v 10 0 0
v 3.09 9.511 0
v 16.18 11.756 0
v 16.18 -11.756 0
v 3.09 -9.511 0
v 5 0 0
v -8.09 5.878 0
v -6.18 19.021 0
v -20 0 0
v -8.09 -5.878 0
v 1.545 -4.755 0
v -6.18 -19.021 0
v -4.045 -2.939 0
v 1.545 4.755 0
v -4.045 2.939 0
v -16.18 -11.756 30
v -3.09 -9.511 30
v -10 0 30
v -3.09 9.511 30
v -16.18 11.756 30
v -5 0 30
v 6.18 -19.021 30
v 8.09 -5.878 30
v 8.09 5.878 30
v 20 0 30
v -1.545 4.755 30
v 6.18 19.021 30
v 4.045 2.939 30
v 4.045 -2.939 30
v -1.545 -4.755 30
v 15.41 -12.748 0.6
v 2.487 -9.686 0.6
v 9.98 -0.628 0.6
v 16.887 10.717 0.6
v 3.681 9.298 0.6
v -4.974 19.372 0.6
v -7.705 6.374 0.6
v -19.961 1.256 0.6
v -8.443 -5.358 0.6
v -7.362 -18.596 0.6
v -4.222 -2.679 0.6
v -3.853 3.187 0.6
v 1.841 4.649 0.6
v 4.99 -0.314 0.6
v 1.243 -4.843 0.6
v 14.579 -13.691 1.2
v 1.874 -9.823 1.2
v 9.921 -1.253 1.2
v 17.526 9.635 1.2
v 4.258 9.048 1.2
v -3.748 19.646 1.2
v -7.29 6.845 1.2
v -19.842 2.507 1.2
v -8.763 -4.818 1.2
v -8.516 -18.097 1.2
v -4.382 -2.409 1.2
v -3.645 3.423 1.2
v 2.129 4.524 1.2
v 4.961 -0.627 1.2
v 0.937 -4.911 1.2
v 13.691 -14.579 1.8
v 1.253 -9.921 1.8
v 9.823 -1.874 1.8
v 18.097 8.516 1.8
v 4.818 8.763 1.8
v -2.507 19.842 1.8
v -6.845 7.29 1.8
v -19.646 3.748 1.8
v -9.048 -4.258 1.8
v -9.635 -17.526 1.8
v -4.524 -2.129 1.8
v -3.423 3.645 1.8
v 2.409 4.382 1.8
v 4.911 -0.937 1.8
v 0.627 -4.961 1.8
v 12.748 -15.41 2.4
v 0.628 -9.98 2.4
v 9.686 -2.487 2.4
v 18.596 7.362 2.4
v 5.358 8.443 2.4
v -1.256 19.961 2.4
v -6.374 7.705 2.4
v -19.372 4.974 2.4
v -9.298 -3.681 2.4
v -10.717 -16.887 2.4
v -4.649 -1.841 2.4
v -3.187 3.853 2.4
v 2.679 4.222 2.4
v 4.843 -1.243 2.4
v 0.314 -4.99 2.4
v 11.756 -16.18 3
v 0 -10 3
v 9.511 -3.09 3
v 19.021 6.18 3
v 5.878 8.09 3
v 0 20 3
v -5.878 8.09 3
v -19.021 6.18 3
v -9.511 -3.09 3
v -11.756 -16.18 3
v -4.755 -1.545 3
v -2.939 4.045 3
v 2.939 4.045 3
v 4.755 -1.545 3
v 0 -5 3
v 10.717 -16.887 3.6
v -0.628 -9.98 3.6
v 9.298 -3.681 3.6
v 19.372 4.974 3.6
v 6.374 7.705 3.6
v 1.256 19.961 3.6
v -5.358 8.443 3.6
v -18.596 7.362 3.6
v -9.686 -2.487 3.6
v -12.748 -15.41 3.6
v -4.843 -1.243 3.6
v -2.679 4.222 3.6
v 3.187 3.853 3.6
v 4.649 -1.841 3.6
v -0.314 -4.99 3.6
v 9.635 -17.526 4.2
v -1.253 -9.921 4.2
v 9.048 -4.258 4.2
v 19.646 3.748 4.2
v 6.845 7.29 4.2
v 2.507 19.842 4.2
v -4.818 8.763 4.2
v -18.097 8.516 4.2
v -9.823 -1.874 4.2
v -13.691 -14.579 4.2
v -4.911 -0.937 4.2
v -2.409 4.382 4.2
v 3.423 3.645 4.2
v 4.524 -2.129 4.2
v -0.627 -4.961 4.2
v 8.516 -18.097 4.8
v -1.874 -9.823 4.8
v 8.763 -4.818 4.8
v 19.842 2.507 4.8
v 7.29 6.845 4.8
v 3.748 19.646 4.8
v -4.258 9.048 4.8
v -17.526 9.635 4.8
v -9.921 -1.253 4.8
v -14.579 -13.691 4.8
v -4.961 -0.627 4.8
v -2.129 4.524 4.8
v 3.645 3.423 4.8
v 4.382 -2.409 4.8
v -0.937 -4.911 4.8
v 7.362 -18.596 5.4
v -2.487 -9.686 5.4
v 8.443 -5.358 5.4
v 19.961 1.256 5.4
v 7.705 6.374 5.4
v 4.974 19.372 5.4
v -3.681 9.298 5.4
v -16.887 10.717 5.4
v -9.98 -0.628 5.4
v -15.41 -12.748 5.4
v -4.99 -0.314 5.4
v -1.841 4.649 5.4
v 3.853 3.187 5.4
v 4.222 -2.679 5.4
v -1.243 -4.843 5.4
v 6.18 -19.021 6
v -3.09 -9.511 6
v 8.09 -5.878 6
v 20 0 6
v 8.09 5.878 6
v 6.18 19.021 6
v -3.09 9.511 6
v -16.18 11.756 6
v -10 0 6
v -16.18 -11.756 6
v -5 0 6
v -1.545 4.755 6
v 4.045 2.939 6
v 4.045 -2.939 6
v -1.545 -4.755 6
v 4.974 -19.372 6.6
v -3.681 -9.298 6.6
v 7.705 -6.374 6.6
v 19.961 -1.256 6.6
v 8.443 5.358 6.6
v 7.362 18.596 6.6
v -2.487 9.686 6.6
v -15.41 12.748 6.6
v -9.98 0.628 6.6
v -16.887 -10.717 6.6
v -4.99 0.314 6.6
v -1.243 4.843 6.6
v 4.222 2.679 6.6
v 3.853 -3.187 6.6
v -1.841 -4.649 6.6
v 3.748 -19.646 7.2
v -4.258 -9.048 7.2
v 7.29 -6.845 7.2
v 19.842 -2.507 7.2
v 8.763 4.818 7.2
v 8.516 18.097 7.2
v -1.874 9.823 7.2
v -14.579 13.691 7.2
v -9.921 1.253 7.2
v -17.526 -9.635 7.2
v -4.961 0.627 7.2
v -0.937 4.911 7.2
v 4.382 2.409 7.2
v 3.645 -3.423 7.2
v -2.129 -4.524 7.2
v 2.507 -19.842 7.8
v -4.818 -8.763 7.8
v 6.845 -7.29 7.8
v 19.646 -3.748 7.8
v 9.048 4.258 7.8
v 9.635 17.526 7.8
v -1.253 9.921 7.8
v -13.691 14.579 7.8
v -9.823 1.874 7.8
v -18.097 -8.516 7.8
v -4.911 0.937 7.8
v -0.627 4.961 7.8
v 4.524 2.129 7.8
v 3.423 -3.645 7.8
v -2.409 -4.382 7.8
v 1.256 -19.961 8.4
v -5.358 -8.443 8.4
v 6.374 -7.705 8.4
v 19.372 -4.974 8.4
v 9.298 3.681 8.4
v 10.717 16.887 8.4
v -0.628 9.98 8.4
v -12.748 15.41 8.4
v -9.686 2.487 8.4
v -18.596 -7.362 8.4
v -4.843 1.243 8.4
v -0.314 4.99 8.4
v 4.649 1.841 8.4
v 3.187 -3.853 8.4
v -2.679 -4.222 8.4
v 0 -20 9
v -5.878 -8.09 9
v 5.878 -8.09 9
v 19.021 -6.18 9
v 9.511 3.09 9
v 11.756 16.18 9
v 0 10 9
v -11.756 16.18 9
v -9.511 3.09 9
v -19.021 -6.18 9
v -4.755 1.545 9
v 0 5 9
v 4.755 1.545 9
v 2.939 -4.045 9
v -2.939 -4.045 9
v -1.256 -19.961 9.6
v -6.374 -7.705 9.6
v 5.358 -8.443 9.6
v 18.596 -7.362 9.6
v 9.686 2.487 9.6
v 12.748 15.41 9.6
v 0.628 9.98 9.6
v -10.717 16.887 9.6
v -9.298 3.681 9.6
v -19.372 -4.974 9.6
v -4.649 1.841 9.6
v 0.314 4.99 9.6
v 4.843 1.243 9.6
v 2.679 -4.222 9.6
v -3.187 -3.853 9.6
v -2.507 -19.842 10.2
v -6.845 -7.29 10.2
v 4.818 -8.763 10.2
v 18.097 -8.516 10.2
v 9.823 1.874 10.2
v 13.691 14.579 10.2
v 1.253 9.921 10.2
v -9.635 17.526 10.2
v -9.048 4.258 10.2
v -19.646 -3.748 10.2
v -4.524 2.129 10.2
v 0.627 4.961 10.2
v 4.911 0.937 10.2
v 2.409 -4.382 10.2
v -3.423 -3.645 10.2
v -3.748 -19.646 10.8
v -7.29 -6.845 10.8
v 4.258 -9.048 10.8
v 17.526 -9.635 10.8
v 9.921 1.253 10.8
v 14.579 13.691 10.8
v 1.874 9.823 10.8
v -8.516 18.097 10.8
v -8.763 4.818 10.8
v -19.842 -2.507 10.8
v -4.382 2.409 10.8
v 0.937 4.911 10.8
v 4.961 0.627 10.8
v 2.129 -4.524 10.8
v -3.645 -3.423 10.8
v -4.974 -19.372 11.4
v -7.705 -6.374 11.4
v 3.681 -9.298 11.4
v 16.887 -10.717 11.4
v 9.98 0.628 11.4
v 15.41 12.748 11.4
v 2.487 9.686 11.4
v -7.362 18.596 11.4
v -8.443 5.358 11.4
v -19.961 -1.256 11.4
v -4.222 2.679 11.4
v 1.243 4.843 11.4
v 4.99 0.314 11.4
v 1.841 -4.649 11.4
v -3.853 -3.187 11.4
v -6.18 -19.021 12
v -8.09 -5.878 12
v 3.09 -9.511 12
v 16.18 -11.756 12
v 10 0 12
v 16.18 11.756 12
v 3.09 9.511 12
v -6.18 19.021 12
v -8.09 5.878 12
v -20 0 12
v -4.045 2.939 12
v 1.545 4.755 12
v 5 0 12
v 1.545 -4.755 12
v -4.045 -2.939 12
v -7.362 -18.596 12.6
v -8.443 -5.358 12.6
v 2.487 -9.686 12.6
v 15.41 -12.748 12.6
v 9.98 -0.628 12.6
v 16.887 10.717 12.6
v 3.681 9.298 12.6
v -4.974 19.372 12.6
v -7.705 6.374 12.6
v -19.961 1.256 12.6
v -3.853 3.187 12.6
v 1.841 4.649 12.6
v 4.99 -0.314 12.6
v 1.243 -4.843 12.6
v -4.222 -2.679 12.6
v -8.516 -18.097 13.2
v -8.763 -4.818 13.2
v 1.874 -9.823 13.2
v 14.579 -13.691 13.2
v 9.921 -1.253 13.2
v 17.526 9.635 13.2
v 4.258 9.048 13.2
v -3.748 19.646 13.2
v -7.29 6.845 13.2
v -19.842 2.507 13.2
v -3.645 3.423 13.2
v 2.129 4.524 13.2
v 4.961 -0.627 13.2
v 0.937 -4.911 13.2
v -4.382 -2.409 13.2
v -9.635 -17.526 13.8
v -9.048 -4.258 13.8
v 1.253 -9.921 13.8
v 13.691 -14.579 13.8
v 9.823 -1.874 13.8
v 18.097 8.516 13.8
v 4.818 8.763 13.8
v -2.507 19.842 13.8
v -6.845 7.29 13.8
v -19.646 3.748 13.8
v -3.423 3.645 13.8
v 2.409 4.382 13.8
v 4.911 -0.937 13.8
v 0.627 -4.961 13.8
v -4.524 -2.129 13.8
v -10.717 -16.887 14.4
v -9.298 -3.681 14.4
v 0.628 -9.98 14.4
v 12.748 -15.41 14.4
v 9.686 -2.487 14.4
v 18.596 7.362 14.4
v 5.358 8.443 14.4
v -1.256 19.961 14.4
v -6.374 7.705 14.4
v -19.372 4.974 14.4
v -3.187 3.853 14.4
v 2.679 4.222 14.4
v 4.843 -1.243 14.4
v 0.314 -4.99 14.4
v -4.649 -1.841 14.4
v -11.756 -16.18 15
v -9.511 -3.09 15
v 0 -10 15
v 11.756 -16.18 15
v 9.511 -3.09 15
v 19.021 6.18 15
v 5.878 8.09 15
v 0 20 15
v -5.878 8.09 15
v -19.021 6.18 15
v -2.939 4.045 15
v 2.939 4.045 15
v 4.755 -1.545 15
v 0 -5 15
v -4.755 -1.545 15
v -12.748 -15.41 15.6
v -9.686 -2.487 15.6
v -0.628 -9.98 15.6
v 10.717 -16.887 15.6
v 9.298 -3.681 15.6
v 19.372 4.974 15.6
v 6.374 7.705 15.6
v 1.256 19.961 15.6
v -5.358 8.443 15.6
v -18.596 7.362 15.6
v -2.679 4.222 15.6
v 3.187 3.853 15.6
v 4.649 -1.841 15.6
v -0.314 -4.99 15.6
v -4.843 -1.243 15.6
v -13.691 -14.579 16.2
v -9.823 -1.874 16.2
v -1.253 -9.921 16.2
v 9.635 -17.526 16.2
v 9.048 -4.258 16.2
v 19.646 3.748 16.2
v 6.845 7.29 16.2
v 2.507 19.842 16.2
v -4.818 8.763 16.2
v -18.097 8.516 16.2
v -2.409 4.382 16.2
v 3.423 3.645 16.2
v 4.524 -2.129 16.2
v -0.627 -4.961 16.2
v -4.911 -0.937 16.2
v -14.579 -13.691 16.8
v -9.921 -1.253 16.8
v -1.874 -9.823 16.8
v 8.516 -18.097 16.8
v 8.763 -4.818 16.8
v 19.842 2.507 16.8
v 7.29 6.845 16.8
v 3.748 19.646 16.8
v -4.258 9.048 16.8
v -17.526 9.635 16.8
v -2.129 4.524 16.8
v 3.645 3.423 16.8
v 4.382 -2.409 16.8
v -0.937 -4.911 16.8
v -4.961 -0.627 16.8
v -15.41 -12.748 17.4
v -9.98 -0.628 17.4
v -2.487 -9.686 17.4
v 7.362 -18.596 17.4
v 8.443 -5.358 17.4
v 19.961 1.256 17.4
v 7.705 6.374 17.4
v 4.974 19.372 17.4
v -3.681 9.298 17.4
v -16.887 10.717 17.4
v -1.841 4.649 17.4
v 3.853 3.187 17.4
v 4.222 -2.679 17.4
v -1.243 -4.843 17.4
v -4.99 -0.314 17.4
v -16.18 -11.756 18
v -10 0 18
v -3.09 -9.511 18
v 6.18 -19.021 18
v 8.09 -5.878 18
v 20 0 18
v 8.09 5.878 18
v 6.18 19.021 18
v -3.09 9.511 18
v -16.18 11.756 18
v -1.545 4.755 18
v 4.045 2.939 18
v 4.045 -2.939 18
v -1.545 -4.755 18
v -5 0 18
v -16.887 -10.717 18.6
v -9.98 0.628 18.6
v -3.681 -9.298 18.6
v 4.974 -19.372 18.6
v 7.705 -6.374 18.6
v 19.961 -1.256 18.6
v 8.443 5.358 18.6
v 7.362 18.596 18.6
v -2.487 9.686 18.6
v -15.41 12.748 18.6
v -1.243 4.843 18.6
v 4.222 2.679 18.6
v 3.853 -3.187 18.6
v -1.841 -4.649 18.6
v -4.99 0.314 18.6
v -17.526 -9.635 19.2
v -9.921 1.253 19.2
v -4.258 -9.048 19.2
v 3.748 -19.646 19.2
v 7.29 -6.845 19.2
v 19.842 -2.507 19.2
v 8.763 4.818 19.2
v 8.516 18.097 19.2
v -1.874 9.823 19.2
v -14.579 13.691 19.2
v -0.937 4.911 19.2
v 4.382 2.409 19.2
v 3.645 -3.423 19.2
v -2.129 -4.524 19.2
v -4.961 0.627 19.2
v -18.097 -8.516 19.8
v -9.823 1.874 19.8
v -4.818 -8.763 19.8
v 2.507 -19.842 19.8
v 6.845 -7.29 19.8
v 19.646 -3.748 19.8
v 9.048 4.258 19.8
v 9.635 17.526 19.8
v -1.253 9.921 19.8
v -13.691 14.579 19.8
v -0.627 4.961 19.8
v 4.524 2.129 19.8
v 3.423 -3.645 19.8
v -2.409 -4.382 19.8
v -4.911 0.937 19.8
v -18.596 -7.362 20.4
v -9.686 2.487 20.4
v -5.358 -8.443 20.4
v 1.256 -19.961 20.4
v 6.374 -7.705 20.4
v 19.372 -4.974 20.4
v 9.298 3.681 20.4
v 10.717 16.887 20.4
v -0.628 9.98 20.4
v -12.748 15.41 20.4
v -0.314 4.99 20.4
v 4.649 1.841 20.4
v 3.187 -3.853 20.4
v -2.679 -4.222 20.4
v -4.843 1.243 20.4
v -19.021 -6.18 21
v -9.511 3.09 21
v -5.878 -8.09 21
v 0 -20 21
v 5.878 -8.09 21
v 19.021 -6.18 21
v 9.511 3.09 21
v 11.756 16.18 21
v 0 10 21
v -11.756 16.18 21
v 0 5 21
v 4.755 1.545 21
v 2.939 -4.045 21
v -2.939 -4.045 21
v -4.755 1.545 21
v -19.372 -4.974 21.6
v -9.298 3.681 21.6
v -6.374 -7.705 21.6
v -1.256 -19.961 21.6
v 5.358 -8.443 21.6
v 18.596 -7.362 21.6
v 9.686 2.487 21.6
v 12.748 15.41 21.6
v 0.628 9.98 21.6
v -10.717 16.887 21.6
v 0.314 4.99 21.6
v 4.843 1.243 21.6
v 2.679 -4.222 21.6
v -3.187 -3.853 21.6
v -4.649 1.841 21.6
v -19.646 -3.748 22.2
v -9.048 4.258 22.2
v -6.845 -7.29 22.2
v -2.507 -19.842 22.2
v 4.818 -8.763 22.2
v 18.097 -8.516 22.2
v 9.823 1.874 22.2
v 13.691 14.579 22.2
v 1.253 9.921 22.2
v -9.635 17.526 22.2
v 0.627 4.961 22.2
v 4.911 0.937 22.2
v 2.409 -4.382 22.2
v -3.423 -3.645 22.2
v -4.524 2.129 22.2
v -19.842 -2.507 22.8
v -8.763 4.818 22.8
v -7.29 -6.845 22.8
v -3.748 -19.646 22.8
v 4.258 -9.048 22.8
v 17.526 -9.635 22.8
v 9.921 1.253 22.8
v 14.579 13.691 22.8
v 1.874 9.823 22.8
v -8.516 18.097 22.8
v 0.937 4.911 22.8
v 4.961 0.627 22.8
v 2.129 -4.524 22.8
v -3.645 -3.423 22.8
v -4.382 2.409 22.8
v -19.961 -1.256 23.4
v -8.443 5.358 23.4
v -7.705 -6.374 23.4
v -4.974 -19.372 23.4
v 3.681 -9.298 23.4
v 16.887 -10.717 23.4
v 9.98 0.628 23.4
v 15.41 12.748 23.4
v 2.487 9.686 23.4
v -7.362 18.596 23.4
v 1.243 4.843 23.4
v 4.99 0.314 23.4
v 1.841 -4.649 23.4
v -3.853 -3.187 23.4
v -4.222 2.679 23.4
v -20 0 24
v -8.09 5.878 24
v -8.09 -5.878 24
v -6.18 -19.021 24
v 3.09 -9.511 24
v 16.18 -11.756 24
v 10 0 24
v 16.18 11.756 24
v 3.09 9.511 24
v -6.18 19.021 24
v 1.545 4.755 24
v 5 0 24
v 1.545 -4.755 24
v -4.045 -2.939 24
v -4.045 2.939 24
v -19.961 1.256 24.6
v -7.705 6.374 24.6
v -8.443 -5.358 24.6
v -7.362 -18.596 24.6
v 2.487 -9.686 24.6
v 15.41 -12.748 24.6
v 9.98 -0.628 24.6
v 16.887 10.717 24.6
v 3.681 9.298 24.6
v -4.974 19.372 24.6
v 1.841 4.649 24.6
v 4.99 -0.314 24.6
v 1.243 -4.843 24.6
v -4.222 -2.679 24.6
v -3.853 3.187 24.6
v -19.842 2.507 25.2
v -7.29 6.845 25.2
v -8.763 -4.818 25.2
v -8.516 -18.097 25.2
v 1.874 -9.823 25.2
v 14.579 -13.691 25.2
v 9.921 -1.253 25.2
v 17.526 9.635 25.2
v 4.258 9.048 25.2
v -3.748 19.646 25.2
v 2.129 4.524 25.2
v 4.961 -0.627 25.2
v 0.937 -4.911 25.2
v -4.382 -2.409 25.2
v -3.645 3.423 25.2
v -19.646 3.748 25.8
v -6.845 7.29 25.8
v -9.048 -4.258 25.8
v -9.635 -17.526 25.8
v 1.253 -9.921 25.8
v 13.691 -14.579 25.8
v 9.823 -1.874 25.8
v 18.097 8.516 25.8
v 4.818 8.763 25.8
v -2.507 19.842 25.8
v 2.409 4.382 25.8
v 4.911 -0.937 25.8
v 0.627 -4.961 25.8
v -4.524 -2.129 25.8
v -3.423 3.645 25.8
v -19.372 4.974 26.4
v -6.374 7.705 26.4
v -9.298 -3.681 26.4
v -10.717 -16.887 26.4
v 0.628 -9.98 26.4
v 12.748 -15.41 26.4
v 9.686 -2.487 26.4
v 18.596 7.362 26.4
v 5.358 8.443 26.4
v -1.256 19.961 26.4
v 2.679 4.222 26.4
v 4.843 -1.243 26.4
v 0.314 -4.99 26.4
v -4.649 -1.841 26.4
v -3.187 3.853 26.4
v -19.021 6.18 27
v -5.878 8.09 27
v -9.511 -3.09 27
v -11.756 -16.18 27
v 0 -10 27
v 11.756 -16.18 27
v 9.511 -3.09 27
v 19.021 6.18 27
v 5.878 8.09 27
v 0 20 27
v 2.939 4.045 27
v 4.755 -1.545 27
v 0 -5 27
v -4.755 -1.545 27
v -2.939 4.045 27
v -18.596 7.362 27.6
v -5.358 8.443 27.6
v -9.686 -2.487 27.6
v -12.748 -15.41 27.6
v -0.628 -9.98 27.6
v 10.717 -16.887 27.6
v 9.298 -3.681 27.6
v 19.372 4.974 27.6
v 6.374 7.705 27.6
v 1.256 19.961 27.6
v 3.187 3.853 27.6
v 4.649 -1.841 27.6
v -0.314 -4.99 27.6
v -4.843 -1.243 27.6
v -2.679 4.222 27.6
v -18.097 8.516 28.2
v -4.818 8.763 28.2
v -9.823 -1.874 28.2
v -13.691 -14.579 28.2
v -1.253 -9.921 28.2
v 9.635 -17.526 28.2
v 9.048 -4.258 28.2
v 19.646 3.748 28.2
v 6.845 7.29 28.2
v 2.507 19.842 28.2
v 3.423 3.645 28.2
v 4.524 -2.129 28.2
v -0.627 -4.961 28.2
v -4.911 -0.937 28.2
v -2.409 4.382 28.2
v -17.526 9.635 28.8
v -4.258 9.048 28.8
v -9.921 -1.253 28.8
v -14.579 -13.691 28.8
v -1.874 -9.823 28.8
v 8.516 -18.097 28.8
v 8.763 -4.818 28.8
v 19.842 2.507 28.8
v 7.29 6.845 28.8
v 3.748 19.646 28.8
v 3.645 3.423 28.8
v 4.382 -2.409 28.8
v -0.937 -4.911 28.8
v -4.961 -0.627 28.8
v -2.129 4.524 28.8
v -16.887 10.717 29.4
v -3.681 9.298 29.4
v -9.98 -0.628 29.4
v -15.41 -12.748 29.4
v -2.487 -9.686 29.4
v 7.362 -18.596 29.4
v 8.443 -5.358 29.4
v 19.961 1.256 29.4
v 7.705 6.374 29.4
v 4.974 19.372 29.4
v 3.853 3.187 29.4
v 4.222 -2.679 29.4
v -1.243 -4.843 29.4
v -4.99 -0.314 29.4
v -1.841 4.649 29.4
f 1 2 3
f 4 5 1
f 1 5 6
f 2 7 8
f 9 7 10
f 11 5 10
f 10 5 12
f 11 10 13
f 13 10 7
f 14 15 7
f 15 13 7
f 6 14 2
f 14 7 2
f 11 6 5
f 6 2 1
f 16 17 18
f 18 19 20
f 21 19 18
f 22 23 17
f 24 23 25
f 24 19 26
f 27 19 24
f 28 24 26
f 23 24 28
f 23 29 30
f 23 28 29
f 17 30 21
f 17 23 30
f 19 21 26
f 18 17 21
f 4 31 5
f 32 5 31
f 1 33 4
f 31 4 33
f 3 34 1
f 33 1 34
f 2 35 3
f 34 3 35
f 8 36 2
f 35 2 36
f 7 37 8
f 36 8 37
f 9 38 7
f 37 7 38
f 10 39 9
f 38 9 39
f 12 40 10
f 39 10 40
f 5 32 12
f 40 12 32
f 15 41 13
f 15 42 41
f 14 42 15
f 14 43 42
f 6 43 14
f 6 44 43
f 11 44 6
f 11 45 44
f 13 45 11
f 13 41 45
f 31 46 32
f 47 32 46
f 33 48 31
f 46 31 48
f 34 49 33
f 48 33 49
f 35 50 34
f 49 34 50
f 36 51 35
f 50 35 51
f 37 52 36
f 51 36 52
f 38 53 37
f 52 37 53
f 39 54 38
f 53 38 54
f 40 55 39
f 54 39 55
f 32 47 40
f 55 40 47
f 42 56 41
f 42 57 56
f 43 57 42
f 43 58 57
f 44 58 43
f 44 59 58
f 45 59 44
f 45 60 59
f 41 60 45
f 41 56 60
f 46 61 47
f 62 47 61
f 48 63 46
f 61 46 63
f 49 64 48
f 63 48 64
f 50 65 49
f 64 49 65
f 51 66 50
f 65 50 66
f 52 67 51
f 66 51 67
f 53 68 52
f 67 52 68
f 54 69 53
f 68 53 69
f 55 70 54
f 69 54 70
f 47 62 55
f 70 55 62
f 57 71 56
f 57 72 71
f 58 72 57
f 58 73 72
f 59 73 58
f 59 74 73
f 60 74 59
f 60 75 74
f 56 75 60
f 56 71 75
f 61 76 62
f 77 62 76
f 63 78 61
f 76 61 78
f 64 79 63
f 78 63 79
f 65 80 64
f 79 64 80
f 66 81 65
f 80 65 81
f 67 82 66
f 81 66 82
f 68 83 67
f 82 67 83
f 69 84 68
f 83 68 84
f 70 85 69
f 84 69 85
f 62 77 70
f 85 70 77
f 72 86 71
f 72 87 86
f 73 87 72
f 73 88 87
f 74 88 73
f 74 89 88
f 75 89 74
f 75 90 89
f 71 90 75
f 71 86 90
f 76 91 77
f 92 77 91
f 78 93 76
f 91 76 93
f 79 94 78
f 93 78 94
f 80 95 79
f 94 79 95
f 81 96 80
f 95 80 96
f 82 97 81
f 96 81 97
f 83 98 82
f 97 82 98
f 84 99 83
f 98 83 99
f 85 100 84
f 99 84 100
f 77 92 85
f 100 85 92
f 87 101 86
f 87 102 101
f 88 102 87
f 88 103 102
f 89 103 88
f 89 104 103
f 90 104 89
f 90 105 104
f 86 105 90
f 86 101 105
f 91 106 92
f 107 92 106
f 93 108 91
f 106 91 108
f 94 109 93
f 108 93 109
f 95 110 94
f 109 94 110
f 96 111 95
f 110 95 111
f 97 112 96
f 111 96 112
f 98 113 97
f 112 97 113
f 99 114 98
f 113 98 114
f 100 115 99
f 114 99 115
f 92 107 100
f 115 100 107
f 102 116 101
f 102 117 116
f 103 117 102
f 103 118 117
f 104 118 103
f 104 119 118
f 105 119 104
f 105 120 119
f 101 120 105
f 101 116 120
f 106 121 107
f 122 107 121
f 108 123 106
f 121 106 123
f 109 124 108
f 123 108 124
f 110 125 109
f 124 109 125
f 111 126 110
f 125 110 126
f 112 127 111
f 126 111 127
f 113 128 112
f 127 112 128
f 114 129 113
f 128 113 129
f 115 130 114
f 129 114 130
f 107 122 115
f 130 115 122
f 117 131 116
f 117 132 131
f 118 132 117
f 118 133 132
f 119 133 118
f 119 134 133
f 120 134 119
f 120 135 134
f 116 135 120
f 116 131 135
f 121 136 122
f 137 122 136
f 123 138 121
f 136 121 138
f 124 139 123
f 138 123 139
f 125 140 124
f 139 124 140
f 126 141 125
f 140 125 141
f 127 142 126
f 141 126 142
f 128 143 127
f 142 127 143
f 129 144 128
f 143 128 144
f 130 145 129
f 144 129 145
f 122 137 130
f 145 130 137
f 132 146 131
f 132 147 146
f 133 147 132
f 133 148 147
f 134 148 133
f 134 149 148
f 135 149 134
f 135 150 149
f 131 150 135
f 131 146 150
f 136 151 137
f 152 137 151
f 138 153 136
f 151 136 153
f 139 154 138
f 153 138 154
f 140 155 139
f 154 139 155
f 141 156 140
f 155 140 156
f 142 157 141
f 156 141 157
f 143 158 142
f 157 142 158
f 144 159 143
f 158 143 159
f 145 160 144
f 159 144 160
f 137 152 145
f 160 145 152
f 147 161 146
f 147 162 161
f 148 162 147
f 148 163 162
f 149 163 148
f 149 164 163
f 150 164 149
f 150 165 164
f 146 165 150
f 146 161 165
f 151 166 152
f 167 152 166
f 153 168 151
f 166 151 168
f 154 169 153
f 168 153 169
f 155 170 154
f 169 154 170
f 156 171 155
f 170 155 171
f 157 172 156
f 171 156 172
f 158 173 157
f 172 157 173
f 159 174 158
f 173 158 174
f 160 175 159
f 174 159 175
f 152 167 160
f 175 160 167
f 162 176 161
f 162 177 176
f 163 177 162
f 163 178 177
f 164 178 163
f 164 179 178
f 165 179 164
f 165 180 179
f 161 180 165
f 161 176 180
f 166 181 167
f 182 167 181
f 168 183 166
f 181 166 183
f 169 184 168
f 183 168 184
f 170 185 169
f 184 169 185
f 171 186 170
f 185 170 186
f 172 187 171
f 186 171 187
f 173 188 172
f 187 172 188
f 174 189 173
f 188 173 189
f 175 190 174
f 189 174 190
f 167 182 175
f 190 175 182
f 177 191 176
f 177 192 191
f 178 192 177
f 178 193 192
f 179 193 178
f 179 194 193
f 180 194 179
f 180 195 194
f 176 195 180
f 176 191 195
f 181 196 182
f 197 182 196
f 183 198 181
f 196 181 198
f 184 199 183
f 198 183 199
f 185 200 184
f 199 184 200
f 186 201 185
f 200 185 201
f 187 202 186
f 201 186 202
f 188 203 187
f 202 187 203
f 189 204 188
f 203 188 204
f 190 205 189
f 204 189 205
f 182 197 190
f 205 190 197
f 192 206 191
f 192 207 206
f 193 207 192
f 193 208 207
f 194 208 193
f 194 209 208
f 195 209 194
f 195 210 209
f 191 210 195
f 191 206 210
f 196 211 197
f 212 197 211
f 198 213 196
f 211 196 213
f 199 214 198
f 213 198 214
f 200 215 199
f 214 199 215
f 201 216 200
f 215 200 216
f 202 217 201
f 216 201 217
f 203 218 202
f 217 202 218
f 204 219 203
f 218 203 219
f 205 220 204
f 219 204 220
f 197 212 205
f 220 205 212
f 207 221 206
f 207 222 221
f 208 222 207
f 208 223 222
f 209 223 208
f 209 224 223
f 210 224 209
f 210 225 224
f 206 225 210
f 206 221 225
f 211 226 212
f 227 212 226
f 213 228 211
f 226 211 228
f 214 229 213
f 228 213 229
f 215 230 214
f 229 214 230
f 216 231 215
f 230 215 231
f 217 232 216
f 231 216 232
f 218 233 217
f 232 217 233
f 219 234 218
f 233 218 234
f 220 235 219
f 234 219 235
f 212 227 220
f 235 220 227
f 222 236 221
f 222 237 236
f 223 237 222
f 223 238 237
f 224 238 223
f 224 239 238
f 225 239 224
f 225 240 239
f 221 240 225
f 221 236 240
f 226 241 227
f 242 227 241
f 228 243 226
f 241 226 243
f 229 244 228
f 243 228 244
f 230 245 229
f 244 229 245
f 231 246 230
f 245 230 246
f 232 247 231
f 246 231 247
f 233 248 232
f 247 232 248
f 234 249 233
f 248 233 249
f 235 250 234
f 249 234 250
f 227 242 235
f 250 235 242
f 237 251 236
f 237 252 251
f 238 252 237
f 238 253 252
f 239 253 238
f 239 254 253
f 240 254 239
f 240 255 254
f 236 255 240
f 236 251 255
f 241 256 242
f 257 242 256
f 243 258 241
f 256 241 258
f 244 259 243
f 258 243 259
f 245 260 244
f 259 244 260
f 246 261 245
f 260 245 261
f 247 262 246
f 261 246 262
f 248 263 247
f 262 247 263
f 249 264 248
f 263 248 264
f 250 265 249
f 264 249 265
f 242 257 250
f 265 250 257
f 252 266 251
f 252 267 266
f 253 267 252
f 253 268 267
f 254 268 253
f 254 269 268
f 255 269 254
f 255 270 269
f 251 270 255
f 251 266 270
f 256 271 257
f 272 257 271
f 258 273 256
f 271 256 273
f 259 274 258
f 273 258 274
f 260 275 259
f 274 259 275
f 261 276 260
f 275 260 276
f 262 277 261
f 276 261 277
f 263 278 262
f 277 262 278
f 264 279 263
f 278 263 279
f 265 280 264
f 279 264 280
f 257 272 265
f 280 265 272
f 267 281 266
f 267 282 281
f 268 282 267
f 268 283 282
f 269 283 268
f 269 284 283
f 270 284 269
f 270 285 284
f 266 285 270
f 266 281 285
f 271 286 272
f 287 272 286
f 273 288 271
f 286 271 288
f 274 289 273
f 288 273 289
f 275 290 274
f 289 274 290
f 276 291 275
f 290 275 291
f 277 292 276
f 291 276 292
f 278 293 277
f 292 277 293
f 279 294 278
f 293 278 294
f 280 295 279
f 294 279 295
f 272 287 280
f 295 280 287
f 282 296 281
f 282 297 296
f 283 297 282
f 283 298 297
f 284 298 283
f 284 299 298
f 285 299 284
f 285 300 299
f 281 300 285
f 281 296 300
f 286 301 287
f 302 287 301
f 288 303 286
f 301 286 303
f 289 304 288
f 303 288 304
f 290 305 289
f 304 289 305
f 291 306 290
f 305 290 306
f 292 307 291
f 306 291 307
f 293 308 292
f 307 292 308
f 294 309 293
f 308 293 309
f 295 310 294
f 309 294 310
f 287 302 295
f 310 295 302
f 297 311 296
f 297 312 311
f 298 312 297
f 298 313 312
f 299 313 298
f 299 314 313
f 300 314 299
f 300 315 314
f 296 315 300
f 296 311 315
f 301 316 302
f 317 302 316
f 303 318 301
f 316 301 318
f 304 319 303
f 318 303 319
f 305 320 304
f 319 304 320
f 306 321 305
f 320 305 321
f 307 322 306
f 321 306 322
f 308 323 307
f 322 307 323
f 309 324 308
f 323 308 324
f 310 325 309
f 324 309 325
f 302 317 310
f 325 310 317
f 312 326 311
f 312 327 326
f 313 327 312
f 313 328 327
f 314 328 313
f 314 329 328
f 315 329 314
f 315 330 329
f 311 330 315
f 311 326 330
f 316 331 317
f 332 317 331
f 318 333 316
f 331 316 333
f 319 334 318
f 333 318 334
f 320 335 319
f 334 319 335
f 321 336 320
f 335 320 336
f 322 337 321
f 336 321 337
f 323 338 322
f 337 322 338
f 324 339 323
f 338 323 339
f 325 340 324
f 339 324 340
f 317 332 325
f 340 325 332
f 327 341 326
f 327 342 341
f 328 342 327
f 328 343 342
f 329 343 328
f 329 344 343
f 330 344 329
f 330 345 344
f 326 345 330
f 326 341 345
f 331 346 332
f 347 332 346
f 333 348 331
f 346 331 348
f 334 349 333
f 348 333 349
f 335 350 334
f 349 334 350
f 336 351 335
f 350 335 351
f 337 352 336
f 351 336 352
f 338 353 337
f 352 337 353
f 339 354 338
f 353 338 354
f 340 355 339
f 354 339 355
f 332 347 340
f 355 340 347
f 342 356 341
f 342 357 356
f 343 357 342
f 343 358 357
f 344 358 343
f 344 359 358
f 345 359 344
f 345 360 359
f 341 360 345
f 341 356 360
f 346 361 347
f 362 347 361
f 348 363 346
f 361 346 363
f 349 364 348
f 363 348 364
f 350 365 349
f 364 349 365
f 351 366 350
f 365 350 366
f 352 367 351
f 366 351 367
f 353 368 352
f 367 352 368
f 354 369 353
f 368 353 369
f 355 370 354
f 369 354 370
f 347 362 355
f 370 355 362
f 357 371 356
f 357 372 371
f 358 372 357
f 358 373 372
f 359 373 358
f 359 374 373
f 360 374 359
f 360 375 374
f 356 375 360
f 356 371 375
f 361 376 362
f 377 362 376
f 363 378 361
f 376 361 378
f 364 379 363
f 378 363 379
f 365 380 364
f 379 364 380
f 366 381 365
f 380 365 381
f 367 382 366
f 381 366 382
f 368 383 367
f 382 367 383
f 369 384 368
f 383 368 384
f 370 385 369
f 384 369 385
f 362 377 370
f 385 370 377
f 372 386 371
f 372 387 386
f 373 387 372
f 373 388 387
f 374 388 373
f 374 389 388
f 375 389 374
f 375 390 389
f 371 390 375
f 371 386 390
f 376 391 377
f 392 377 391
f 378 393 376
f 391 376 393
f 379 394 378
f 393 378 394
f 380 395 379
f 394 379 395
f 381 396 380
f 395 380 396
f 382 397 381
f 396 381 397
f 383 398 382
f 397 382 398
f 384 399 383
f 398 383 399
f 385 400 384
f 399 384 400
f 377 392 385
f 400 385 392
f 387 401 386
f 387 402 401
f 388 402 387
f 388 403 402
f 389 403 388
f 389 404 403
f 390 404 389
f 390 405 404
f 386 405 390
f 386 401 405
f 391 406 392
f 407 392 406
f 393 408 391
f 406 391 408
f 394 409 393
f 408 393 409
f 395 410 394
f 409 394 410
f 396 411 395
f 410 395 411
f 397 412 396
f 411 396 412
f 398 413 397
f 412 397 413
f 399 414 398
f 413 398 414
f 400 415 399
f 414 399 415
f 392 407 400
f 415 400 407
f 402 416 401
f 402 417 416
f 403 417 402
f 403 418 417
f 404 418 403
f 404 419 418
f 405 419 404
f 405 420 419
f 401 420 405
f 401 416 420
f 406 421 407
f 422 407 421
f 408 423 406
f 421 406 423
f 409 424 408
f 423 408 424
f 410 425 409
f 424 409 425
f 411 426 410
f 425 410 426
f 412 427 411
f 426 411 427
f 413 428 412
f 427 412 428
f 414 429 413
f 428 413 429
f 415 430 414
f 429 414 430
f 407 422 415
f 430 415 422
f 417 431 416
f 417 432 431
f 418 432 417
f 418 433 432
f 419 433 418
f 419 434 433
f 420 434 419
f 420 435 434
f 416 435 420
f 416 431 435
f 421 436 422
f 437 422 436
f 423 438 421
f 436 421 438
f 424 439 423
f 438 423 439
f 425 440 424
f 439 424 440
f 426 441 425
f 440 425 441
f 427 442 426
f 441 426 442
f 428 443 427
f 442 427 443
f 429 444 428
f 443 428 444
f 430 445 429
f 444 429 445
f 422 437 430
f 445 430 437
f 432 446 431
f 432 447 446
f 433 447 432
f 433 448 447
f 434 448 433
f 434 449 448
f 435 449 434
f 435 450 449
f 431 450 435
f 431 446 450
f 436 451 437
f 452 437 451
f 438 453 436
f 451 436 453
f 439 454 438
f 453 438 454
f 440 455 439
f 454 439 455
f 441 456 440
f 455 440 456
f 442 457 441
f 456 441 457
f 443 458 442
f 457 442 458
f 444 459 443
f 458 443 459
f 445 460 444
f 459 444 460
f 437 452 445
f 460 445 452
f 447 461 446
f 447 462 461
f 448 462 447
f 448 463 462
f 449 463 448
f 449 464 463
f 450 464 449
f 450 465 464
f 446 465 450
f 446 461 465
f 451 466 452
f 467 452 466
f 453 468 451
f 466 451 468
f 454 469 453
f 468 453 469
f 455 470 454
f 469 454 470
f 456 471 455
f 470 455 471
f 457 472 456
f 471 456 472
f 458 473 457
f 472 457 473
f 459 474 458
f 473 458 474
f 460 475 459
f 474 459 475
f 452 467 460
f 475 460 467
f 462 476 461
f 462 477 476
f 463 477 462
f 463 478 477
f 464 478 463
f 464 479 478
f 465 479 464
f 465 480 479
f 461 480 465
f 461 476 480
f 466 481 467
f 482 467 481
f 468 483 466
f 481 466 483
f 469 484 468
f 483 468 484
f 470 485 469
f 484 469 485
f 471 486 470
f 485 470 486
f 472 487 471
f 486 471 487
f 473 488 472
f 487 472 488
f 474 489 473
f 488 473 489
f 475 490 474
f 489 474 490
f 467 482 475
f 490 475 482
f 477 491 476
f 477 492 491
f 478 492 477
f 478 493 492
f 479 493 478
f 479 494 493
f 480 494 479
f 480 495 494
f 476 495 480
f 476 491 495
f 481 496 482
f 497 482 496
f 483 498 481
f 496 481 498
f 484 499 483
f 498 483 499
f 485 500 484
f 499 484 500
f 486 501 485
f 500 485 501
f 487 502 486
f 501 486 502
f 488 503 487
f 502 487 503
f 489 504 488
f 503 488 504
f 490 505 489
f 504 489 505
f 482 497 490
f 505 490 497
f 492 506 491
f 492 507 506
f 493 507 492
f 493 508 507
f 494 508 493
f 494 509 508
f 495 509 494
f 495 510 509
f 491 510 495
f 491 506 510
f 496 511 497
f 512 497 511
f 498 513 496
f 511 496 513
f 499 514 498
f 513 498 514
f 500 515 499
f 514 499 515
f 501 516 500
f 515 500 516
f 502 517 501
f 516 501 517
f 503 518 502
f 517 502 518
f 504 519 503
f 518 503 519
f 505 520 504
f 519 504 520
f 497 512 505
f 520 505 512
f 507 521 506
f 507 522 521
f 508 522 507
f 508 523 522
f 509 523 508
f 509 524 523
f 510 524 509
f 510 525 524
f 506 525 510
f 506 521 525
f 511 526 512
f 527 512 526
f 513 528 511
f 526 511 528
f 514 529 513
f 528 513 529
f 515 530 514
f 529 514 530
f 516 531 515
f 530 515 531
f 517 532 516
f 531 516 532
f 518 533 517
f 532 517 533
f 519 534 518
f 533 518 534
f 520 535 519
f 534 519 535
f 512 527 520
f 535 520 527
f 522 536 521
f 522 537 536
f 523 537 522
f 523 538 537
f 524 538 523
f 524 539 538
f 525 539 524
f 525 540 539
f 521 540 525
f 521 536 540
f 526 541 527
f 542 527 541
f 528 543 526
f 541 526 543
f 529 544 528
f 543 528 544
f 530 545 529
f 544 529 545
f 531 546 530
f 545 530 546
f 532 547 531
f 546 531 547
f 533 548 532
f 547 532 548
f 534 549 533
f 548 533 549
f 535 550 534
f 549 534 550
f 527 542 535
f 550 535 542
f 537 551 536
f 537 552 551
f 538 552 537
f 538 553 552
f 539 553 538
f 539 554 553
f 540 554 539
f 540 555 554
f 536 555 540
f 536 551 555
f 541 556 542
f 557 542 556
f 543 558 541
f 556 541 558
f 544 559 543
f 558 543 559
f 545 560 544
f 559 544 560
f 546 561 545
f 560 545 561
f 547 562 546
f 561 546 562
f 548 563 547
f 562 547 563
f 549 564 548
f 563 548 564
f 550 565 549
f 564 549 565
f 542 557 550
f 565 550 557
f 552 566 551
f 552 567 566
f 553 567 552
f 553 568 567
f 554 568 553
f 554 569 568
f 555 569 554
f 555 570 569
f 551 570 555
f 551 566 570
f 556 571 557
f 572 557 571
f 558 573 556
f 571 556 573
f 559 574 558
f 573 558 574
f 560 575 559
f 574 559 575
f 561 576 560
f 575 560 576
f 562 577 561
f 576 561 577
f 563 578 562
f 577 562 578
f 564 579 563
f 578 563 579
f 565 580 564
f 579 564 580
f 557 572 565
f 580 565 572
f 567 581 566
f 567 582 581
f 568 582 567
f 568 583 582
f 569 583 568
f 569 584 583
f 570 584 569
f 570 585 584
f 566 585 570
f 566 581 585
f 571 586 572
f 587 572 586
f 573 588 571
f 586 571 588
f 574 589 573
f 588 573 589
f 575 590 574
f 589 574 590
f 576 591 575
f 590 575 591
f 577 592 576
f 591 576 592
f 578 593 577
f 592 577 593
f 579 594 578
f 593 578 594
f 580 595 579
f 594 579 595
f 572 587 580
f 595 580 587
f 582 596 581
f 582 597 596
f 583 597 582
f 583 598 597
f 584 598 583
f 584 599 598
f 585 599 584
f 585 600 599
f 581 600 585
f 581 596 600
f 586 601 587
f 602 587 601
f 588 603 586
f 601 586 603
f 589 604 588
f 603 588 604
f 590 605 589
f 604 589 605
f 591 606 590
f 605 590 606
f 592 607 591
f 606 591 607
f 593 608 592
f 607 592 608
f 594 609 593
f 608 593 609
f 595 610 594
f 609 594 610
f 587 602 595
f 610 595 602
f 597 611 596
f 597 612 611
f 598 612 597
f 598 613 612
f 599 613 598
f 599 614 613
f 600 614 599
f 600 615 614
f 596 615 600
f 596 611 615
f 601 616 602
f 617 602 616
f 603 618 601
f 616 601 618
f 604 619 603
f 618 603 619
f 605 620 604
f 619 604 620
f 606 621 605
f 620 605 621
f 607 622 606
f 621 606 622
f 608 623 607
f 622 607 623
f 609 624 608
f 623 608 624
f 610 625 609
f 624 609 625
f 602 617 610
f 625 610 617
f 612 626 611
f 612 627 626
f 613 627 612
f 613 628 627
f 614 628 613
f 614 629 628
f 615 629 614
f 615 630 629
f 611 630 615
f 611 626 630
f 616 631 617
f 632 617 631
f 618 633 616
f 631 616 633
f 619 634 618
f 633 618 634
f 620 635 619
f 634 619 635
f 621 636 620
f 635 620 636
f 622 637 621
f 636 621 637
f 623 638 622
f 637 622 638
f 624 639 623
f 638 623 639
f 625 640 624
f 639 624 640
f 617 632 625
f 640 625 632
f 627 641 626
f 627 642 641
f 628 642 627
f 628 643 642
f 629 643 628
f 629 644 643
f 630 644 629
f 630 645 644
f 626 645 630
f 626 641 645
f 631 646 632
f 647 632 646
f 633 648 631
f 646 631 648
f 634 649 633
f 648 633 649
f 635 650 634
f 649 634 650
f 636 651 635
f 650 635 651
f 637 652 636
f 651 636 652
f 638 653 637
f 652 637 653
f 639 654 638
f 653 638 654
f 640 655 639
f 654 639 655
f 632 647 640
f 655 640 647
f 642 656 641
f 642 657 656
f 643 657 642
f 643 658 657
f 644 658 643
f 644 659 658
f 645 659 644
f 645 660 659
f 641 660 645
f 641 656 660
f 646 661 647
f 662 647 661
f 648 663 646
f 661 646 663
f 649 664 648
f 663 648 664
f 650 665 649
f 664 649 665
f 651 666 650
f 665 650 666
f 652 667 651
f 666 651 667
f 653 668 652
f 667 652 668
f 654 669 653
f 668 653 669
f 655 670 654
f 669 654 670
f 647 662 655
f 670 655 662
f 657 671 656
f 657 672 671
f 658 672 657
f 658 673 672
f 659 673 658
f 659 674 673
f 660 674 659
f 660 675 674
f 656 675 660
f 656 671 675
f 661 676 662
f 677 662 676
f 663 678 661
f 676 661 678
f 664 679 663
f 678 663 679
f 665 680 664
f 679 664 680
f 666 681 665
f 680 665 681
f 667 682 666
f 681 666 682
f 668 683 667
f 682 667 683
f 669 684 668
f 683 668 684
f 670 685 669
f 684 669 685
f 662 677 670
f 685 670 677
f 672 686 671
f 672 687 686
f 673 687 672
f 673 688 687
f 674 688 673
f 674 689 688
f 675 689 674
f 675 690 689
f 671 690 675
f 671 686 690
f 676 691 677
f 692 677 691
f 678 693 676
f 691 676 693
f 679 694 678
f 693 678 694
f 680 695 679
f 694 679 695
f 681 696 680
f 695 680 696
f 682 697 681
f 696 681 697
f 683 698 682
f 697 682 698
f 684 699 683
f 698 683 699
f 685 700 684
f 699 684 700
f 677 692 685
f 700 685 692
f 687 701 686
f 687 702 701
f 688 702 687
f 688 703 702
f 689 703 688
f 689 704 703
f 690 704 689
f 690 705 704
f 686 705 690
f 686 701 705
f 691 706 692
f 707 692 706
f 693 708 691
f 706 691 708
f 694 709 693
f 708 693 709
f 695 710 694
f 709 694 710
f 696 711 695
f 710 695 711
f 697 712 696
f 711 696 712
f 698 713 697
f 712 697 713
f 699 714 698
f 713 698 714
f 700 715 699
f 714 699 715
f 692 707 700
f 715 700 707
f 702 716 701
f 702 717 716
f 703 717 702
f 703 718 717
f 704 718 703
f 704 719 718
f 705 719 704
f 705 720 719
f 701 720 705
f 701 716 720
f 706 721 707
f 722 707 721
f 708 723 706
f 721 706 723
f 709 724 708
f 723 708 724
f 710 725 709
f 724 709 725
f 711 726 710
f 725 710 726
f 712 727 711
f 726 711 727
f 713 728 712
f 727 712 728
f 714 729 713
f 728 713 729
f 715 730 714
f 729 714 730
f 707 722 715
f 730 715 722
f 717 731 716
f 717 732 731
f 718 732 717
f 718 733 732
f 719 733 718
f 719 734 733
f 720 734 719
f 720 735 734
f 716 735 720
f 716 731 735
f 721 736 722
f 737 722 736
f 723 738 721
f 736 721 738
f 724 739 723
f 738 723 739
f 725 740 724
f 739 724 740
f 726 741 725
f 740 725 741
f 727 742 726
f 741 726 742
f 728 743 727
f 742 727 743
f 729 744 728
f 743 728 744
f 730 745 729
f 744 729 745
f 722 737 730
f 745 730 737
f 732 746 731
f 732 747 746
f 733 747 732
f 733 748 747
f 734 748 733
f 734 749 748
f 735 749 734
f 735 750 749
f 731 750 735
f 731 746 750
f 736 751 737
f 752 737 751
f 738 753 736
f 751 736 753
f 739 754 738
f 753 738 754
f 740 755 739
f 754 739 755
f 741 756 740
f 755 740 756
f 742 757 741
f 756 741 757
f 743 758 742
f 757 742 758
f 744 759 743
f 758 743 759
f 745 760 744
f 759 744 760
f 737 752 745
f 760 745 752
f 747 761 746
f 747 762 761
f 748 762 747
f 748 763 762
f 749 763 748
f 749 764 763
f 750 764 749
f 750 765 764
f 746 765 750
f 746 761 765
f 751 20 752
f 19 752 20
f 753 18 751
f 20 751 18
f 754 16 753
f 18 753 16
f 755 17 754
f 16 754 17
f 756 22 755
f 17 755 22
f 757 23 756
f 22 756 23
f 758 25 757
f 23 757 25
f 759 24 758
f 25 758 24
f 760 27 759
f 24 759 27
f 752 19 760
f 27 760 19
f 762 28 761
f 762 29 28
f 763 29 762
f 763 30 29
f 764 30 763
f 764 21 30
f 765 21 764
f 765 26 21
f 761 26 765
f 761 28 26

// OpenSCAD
// Complex polygon with holes extruded with twist
module complex_shape() {
    // Outer shape - star
    outer_points = [
        for (i = [0:9]) 
            let (angle = i * 36)
            let (r = (i % 2) ? 20 : 10)
            [r * cos(angle), r * sin(angle)]
    ];
    
    // Inner hole - pentagon
    hole_points = [
        for (i = [0:4])
            let (angle = i * 72)
            [5 * cos(angle), 5 * sin(angle)]
    ];
    
    linear_extrude(height = 30, twist = 180, slices = 50)
        difference() {
            polygon(points = outer_points);
            polygon(points = hole_points);
        }
}

complex_shape();
